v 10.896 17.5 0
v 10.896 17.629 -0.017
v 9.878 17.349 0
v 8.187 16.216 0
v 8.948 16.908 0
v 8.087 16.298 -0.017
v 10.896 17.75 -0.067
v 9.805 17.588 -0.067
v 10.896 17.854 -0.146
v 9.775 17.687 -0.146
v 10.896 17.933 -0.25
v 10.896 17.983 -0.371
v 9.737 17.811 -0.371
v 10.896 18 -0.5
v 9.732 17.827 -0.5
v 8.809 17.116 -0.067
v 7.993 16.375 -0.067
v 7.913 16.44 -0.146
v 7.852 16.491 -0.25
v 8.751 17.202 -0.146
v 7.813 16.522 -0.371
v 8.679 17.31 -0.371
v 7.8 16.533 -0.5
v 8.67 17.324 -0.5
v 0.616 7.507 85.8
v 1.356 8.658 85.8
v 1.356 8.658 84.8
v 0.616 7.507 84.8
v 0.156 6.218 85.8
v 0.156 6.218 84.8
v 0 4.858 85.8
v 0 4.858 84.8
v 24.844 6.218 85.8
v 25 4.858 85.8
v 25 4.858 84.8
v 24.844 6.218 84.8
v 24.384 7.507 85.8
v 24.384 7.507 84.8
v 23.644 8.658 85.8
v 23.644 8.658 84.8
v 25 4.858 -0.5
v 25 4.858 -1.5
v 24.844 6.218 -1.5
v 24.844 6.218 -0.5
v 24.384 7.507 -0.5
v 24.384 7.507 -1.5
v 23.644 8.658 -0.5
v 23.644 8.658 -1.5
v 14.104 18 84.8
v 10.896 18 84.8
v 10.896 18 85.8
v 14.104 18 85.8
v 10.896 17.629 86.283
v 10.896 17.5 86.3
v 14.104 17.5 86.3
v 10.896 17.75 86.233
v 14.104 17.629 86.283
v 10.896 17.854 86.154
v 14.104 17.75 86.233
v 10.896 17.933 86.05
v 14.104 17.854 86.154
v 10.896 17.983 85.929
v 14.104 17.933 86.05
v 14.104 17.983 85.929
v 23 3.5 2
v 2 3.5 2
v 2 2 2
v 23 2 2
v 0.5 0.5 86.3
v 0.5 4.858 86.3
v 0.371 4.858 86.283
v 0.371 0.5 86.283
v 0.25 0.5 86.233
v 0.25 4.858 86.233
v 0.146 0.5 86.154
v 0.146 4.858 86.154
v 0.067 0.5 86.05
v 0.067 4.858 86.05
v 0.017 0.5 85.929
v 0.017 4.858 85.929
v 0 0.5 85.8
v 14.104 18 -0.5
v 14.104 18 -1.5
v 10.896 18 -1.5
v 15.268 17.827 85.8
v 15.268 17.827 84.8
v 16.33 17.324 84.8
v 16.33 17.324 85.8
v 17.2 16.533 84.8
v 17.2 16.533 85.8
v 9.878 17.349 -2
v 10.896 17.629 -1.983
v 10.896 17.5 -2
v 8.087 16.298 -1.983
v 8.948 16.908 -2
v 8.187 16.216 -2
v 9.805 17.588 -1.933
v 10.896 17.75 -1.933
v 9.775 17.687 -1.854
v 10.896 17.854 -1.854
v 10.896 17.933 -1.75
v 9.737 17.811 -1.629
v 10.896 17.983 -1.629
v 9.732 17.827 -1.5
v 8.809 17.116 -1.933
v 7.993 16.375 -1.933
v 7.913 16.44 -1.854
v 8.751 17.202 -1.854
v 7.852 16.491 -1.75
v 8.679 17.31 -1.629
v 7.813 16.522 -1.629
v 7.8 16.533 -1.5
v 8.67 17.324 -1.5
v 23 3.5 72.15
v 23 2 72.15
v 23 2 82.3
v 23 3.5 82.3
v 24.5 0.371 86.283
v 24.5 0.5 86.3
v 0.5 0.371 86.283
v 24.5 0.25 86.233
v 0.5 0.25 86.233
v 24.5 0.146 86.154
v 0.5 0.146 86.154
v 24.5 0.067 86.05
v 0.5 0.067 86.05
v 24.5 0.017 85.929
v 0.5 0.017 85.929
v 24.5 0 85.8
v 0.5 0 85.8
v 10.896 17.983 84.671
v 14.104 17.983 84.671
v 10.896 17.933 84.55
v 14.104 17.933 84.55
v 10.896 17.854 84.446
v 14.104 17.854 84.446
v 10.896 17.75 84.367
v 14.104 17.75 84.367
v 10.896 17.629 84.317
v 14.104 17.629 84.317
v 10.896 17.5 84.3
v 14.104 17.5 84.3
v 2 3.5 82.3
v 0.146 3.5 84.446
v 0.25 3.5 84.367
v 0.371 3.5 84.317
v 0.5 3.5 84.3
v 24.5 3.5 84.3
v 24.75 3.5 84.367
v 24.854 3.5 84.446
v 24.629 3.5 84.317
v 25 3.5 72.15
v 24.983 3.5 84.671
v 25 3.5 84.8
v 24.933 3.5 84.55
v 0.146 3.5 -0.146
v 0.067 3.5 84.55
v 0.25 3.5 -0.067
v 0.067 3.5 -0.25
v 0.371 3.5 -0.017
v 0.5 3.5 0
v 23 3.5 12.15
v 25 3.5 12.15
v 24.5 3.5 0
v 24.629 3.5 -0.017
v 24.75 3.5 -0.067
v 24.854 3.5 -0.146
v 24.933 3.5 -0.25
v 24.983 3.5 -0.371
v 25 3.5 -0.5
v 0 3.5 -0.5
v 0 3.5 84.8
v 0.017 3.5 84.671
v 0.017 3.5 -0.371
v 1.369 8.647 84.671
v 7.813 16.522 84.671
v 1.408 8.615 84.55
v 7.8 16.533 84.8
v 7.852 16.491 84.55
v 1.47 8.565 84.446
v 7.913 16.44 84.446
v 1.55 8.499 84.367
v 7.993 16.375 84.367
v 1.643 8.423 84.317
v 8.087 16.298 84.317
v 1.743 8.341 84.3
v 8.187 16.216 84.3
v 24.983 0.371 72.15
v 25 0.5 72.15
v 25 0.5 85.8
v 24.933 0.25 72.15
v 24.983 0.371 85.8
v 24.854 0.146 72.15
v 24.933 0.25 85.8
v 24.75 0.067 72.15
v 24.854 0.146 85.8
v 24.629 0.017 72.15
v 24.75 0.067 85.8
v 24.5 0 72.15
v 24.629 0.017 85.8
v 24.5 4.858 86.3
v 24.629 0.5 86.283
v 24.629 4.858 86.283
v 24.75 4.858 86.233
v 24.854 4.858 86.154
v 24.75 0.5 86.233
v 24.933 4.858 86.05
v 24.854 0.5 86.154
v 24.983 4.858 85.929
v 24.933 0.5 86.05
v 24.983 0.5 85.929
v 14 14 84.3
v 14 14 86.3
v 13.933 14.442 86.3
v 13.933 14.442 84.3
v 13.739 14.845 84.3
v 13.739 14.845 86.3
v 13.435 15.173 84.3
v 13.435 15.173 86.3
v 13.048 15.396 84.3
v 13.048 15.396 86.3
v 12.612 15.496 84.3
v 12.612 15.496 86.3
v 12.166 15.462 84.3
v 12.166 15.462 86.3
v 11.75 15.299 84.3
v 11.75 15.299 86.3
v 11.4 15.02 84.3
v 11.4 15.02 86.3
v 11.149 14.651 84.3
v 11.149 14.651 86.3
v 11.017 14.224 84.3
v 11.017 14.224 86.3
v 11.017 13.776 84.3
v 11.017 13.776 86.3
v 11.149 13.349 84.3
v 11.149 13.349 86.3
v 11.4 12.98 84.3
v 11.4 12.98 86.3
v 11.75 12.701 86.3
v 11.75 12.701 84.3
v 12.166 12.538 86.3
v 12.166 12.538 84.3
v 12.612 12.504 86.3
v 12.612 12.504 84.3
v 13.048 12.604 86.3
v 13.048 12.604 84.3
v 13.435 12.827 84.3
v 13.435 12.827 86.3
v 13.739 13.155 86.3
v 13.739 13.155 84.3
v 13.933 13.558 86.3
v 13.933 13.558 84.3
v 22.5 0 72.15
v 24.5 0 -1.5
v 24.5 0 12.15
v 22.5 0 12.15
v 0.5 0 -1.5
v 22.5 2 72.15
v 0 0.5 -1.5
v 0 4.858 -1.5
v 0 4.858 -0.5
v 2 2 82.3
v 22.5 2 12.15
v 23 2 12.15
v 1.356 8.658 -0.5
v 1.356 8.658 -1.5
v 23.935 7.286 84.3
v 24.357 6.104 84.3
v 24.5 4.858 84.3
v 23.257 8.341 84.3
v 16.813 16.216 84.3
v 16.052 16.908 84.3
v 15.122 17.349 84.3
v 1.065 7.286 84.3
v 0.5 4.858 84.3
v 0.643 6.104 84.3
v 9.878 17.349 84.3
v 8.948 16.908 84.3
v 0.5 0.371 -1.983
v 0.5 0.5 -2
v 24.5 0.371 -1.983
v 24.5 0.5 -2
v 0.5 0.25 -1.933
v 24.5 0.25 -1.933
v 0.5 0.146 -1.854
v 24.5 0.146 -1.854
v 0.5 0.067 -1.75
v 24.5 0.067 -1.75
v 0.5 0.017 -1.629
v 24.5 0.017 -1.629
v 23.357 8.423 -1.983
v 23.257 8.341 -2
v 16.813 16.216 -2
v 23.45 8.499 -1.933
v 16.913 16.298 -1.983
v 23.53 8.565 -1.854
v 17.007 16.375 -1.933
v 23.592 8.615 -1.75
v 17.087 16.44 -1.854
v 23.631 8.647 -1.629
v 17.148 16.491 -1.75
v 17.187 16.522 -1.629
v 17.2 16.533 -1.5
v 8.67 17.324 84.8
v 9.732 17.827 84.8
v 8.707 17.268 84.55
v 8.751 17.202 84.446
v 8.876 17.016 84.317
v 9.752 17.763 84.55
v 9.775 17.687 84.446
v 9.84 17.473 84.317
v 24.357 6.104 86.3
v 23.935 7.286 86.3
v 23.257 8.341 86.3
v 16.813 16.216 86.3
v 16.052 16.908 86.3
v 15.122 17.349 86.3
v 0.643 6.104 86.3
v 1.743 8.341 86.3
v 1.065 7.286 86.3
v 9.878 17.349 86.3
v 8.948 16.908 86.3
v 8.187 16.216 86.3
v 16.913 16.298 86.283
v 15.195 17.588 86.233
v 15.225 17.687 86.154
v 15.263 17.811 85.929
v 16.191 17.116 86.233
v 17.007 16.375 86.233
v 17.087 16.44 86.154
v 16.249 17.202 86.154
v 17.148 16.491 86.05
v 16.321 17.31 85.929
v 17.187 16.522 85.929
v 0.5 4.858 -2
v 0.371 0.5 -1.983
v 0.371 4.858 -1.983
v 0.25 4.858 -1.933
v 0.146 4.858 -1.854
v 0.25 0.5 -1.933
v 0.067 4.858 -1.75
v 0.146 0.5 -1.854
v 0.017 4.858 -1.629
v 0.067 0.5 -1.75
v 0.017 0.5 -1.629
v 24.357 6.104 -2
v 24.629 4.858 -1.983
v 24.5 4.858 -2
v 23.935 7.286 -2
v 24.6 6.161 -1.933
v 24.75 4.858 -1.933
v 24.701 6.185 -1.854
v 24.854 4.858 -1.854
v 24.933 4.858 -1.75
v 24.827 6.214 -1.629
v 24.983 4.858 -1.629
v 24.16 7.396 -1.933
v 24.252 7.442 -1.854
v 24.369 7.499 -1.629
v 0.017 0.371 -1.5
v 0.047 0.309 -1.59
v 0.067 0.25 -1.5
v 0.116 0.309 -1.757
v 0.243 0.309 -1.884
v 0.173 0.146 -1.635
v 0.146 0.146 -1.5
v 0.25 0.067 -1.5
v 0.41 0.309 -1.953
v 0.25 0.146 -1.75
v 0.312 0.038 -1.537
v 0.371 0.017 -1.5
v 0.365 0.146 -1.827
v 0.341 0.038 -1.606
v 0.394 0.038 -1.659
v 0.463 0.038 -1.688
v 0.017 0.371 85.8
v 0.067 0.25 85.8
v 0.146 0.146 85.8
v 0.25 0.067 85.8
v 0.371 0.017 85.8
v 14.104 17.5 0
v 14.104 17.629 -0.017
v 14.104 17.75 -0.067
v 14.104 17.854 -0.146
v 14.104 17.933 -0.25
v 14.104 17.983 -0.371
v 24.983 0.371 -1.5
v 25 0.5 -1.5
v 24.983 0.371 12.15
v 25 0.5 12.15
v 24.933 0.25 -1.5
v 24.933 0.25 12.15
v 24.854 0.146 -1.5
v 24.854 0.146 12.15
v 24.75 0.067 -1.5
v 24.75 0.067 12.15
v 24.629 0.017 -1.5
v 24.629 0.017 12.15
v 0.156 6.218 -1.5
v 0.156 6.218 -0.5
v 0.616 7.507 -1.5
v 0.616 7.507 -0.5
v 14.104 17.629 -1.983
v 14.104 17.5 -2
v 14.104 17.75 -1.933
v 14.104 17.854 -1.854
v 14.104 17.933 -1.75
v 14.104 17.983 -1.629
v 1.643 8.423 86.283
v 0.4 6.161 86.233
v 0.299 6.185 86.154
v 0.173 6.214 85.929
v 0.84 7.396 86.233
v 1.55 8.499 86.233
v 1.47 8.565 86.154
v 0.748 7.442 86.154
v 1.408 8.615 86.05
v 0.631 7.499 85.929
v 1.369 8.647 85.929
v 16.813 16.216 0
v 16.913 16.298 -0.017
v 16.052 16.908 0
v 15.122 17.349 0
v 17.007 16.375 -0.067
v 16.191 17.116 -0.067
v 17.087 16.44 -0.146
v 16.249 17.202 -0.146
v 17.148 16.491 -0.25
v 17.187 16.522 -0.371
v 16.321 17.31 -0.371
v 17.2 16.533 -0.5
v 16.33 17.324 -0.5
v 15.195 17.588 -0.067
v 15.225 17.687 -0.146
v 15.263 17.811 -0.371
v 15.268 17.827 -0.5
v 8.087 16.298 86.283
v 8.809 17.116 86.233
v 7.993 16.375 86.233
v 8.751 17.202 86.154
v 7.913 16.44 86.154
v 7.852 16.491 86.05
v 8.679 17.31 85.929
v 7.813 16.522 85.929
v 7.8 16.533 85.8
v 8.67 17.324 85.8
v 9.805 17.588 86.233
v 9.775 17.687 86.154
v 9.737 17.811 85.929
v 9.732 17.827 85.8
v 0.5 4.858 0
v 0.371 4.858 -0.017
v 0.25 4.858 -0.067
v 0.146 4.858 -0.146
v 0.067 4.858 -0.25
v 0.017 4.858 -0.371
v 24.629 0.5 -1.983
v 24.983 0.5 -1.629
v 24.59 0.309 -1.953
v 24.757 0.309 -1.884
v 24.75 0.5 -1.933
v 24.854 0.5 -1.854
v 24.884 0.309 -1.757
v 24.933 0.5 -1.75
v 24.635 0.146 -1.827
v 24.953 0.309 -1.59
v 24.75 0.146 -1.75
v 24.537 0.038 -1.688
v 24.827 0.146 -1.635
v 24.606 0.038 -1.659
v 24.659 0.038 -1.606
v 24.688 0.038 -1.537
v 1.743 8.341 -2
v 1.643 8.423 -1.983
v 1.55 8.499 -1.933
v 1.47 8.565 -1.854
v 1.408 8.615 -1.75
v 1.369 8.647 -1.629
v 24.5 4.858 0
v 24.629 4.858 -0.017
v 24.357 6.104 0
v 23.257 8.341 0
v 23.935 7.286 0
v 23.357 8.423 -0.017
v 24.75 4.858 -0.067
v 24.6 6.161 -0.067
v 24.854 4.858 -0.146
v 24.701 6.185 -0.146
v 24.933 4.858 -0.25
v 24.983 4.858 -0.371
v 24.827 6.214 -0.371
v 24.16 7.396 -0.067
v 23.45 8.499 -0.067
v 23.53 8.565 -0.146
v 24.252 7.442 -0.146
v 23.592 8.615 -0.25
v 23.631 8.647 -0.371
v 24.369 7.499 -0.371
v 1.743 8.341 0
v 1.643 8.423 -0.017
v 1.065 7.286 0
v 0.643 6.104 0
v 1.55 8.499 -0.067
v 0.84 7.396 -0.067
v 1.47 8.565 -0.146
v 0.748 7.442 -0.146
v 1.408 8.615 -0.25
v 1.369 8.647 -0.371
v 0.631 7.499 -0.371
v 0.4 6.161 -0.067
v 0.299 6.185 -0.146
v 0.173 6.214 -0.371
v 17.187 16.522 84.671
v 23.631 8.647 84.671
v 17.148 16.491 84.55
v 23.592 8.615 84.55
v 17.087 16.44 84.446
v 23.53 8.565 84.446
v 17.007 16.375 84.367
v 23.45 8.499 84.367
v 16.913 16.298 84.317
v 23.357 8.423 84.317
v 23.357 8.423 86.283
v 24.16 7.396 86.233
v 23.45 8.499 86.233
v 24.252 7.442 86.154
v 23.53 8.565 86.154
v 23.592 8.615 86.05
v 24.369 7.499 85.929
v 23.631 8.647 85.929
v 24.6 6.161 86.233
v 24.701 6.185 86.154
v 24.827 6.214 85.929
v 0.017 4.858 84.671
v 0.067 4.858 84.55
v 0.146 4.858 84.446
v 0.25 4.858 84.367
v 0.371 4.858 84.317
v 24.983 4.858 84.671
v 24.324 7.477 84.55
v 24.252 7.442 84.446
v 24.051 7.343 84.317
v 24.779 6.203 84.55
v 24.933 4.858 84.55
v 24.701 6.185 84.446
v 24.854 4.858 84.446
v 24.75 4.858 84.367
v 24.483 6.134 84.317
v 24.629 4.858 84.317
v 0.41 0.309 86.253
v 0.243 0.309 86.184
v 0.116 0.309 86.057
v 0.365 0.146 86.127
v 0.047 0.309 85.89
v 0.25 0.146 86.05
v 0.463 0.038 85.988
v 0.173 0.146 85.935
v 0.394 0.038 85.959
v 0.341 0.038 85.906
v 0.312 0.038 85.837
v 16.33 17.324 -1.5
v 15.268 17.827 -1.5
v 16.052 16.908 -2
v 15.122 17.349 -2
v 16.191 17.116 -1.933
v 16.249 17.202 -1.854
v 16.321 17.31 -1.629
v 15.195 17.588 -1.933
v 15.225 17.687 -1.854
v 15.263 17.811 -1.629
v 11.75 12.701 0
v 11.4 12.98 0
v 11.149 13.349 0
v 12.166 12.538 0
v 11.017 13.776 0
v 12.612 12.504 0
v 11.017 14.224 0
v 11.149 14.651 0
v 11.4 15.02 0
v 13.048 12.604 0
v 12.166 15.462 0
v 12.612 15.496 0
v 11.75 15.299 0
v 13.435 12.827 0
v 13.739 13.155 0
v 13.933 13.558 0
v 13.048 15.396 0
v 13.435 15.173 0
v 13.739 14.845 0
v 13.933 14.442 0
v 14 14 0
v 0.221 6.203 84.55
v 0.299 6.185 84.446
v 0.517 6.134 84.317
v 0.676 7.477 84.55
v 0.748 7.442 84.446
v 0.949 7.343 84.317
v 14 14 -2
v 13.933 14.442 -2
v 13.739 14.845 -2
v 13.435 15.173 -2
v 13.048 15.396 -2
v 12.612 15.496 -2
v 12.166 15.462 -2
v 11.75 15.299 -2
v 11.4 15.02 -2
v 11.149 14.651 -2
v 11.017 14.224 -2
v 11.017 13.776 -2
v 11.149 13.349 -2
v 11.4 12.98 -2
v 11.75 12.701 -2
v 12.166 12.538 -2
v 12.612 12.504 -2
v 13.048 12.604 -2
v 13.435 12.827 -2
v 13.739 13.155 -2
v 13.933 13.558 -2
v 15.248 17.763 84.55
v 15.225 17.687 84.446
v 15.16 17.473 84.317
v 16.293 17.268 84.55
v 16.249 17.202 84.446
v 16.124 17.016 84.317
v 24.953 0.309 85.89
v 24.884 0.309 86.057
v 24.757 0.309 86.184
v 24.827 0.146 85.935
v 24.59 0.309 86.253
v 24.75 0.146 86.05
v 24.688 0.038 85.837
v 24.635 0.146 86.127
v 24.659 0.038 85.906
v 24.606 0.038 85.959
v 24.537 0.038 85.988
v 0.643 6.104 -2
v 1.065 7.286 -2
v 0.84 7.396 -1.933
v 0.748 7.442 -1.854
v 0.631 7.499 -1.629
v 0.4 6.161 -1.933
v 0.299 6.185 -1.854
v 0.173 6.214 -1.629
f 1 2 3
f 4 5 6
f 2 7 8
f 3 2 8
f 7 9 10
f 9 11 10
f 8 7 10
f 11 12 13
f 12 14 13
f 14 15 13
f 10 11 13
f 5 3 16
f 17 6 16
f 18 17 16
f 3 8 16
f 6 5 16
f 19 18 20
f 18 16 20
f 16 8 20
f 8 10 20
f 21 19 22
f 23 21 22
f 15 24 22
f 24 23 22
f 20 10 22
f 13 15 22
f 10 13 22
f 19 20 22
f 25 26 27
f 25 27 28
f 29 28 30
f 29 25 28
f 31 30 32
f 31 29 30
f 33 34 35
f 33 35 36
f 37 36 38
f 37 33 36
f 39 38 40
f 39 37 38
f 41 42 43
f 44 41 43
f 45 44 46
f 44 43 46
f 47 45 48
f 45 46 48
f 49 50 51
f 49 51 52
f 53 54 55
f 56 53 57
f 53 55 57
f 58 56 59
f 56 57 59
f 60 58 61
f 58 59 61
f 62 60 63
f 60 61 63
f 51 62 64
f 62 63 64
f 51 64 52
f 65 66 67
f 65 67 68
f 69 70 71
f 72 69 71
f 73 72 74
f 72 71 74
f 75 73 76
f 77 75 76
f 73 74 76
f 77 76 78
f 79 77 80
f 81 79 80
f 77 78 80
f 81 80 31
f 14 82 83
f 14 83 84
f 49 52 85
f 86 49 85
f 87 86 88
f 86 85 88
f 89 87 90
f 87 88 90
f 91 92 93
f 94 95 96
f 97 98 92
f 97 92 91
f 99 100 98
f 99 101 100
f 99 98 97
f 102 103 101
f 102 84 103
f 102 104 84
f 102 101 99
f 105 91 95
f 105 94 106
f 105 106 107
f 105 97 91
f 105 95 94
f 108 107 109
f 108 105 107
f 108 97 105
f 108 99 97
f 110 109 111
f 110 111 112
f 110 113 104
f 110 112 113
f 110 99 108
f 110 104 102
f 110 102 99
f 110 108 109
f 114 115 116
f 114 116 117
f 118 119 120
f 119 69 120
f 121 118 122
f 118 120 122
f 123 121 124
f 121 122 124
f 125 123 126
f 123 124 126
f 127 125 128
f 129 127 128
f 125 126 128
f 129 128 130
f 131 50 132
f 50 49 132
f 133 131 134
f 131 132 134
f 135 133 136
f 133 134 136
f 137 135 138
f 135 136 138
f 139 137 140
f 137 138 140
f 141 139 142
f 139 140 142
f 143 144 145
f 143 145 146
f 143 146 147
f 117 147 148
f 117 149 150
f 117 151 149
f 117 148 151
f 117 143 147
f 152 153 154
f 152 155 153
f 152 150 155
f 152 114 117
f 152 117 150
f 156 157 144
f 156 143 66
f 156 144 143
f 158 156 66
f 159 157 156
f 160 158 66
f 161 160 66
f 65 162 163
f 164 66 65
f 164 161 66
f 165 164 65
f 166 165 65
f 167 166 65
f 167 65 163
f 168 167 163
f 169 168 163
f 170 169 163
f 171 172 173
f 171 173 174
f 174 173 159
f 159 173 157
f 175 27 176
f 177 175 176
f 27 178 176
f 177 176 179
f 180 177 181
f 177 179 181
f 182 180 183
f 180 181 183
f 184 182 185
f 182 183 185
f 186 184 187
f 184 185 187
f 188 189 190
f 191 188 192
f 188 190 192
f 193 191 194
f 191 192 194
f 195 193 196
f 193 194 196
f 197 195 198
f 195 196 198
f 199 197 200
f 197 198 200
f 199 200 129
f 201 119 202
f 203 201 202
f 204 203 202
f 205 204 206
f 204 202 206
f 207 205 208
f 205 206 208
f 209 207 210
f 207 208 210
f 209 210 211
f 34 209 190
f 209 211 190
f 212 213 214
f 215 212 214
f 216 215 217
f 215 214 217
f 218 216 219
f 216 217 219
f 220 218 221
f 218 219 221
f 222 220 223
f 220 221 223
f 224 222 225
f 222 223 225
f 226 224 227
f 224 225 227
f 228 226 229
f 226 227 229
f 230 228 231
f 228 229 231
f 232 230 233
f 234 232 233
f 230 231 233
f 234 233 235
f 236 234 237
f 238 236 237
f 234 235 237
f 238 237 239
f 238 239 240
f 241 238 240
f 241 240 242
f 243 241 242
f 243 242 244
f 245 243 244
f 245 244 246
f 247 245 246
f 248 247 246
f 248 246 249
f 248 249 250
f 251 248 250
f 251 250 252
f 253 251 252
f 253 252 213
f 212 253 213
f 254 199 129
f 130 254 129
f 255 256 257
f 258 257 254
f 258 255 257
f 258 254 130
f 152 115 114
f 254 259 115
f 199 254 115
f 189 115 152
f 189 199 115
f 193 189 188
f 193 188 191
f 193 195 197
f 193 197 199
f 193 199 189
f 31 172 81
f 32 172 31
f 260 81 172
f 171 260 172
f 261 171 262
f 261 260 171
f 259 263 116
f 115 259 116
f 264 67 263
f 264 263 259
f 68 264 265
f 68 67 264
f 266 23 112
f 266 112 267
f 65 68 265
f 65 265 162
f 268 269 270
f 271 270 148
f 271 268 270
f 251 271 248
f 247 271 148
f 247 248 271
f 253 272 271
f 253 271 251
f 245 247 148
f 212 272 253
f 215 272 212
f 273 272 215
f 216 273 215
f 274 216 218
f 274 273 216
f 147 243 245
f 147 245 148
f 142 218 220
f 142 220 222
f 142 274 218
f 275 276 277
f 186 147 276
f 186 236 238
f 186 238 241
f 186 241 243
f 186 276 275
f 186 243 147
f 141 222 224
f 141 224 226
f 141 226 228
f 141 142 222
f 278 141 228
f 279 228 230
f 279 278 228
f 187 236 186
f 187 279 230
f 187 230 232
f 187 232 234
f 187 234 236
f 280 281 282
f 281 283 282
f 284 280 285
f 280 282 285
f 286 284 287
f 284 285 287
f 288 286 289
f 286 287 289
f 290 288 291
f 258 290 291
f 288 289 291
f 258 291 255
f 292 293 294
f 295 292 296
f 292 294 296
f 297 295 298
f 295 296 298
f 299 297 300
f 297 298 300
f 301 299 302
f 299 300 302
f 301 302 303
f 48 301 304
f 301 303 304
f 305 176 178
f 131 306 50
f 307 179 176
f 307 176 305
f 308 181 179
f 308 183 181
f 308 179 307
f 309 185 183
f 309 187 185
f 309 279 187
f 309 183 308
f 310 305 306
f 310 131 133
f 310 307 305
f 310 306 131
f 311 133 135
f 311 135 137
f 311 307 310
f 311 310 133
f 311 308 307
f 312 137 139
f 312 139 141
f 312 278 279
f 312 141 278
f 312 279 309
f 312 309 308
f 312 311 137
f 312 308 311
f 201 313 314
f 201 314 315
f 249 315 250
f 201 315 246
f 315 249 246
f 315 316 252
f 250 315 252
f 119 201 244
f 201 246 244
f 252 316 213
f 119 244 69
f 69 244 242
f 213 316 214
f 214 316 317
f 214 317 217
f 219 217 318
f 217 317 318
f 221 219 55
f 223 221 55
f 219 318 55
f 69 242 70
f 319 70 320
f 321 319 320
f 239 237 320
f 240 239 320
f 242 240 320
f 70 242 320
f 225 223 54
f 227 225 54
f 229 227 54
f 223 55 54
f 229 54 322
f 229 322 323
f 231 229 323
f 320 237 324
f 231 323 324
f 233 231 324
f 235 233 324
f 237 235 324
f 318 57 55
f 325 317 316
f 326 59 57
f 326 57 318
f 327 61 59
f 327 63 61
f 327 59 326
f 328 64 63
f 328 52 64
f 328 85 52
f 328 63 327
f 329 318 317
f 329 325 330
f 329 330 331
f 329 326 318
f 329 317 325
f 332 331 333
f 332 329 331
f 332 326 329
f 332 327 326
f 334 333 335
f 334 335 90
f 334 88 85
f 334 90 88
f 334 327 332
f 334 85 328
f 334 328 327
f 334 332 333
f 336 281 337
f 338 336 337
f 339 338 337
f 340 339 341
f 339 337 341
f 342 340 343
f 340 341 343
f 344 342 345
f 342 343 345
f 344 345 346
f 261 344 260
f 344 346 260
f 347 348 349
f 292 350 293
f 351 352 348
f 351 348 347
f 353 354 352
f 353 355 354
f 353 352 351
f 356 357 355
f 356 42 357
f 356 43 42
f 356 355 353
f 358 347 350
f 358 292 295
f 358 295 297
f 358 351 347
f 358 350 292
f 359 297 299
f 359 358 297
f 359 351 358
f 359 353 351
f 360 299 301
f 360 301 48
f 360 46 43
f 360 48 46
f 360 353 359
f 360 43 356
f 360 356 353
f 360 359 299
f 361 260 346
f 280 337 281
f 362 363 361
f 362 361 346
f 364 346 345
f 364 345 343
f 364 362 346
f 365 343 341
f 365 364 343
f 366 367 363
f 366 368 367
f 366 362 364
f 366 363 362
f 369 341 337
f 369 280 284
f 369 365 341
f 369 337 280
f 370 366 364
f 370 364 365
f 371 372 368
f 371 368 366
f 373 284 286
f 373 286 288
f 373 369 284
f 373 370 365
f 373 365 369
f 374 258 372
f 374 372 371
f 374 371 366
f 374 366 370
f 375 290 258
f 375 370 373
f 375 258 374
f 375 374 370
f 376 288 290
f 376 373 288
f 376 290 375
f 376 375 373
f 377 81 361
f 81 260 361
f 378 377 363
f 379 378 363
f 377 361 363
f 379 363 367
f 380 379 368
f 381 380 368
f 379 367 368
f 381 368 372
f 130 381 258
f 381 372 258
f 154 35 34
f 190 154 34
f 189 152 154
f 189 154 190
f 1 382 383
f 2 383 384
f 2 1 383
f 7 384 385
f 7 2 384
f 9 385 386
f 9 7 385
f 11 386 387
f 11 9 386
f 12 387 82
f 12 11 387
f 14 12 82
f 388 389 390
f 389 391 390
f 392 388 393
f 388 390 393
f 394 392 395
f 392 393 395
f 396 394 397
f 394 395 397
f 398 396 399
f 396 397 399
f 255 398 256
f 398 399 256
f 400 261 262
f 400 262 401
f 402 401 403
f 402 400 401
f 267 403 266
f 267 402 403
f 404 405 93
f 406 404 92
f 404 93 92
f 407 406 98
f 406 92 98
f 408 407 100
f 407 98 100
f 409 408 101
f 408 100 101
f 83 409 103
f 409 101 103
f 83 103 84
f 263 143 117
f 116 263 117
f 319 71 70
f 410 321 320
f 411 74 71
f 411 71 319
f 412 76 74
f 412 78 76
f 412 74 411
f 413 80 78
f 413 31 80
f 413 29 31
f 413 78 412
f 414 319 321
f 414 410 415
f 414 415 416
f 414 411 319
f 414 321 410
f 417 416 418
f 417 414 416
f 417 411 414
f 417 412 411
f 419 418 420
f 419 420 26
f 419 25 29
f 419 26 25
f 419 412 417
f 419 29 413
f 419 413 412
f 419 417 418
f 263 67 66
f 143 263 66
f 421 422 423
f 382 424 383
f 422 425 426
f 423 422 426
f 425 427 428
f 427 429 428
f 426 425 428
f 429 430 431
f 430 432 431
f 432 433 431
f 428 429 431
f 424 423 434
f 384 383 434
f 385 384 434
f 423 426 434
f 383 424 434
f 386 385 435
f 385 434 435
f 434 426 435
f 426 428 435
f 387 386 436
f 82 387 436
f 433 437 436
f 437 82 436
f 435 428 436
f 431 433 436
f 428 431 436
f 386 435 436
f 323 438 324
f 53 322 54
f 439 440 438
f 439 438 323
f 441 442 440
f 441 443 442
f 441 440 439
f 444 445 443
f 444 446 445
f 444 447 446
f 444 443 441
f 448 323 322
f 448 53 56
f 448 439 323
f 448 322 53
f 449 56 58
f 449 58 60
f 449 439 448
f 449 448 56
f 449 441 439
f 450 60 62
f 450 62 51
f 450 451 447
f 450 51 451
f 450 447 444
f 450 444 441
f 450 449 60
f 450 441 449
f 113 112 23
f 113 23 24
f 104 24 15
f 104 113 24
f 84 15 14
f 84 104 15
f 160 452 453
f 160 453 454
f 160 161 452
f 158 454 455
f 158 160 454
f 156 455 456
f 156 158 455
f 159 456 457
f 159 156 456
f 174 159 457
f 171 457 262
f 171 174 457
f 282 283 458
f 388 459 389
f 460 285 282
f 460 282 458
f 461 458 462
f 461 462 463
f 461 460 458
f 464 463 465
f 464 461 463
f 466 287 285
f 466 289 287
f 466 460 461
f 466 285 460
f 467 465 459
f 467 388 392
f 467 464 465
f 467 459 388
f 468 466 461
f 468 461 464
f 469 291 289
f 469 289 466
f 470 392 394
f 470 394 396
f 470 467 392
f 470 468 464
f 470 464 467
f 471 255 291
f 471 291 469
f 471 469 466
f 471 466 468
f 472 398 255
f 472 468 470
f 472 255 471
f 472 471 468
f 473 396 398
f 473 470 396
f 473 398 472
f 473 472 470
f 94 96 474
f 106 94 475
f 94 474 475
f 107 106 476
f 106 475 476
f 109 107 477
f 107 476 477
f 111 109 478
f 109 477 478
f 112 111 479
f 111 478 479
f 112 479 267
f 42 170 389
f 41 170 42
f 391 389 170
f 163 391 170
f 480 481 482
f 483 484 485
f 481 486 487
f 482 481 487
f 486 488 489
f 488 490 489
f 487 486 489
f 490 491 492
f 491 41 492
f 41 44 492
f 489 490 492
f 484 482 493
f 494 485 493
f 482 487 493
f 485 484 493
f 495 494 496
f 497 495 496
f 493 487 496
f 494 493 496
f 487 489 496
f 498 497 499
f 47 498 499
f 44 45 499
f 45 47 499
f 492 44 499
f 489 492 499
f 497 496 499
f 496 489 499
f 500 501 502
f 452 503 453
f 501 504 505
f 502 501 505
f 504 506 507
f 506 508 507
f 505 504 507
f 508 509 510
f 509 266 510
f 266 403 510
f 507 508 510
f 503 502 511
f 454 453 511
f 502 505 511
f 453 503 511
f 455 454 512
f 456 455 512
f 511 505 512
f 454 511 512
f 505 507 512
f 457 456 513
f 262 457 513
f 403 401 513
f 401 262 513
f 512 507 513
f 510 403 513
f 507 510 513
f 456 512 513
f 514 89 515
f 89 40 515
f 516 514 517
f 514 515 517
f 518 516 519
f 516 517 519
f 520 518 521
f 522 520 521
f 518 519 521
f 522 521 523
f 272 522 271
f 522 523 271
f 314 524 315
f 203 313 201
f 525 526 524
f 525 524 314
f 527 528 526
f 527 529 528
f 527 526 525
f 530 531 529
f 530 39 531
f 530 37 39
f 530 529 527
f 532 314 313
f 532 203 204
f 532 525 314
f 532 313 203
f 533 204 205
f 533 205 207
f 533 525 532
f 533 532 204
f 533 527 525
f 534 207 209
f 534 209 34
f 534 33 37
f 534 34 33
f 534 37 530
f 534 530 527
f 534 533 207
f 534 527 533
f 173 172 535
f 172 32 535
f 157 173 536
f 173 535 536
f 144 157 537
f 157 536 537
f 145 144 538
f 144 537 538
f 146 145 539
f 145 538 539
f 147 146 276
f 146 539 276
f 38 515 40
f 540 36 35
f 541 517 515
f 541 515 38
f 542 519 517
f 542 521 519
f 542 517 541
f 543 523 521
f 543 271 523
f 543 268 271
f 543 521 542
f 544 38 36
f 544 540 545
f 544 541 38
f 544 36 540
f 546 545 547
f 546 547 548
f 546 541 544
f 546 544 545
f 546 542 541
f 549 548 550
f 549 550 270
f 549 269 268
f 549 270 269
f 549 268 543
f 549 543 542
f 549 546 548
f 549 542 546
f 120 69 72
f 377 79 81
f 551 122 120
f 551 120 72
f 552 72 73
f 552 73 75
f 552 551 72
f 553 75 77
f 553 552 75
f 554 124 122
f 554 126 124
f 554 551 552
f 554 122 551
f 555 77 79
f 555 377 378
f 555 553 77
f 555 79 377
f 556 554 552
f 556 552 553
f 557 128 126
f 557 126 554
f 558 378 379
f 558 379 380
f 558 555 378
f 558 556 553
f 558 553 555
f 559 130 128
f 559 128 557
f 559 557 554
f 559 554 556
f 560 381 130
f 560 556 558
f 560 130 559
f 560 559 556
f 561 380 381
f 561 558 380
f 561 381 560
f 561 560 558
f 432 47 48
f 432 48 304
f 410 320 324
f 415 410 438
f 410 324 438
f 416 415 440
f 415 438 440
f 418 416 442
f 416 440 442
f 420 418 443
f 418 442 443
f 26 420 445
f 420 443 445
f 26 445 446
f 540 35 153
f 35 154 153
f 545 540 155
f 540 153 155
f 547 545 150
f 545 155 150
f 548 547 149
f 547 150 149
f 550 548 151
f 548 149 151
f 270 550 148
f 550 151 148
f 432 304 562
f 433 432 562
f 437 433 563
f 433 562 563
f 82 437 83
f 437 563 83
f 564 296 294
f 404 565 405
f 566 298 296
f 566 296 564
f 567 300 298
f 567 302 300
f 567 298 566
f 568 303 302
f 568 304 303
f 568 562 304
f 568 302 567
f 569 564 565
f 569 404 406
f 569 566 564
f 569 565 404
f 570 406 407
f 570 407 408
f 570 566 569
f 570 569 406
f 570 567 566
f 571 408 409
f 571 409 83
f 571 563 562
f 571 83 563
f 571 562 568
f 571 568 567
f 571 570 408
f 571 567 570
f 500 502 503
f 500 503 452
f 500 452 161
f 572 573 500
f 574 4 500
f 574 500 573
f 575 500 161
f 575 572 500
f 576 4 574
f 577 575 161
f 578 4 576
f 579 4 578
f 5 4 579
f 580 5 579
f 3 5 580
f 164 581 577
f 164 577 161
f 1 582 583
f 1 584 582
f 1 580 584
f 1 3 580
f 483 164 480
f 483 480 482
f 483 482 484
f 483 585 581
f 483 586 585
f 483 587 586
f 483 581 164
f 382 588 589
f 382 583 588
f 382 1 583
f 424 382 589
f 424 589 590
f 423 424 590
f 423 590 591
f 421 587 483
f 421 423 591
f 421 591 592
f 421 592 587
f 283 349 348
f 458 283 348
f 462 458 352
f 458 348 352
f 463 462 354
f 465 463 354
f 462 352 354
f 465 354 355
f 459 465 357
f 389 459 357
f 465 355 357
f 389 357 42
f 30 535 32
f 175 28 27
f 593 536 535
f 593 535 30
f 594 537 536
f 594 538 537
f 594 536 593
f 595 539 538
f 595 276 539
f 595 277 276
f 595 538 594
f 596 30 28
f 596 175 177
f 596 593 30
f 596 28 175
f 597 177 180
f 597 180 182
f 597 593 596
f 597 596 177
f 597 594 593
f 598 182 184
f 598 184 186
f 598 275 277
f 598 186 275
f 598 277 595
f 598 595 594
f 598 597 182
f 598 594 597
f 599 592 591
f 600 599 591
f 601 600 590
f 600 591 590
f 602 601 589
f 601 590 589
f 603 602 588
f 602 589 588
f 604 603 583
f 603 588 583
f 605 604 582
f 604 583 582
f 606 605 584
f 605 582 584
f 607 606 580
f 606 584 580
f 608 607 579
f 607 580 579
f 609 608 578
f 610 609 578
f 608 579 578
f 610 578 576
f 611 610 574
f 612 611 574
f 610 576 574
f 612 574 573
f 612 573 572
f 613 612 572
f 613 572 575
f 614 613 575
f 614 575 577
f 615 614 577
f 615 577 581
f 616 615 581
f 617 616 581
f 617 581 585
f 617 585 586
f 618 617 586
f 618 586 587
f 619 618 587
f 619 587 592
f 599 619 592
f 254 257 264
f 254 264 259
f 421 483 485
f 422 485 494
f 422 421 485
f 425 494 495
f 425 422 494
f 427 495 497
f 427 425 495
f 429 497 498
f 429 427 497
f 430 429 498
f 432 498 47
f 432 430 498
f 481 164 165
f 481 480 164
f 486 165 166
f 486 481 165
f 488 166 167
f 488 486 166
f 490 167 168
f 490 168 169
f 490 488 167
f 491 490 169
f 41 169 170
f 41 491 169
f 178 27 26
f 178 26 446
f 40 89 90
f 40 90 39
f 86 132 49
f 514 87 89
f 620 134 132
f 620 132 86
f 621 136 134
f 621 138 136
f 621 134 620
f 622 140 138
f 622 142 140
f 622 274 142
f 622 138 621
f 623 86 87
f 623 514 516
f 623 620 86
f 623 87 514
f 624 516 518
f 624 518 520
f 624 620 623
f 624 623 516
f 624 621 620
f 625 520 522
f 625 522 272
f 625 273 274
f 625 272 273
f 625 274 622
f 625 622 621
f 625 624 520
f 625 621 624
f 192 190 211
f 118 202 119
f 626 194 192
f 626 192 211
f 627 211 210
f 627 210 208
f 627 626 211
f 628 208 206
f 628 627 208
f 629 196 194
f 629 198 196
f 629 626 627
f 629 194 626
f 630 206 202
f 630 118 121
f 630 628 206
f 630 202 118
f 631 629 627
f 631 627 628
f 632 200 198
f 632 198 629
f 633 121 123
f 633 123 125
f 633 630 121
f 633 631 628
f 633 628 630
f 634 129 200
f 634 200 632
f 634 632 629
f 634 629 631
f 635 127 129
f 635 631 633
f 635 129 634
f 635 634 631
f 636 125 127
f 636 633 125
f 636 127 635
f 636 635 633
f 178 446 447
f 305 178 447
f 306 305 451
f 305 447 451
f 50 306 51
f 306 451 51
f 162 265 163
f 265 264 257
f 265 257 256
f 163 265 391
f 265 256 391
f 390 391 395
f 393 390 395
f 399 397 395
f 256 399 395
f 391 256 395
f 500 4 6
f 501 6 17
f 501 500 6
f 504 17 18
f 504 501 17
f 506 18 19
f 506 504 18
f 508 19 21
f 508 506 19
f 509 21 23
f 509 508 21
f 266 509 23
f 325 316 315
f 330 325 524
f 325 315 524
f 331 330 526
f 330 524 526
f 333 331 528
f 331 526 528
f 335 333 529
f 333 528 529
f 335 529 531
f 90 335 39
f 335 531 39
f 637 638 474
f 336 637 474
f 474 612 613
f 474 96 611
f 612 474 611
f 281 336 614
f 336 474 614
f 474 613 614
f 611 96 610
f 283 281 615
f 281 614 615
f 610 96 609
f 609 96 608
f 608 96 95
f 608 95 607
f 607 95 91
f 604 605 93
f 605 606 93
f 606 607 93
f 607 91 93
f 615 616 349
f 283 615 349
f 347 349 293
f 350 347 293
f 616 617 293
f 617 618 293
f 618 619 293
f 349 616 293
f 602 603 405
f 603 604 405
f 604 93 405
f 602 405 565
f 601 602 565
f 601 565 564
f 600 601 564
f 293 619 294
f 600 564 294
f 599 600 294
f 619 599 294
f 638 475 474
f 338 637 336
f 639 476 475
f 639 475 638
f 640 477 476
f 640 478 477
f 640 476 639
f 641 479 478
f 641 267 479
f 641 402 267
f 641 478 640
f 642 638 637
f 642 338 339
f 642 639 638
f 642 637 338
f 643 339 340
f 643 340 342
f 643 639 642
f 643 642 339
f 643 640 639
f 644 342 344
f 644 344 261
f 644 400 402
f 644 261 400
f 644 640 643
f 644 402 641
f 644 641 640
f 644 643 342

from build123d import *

# Parameters (mm, degrees)
SKETCH_1_W          = 25
SKETCH_1_H          = 3.5
EXTRUDE_1_DEPTH     = 84.3
SHELL_1_T           = -2
SKETCH_2_W          = 2.5
SKETCH_2_H          = 60
CUT_EXTRUDE_1_DEPTH = 88.998522715
EXTRUDE_2_DEPTH     = 2
EXTRUDE_3_DEPTH     = 2
SKETCH_5_R          = 1.5
CUT_EXTRUDE_2_DEPTH = 94.519463215
FILLET_1_R          = 4
FILLET_2_R          = 6
FILLET_3_R          = 0.5
FILLET_4_R          = 0.5


with BuildPart() as part:
    # 草图1 → 凸台-拉伸1 (new body)
    with BuildSketch(Plane.XY):
        with Locations((12.5, 1.75)):
            Rectangle(SKETCH_1_W, SKETCH_1_H)
    extrude(amount=EXTRUDE_1_DEPTH)

    # 抽壳1
    shell_1_openings = [part.faces().sort_by_distance(p)[0] for p in [
        (12.5, 3.5, 42.15),
    ]]
    offset(amount=SHELL_1_T, openings=shell_1_openings, kind=Kind.INTERSECTION)

    # 草图2 → 切除-拉伸1 (cut, through all)
    with BuildSketch(Plane.XZ):
        with Locations((23.75, 42.15)):
            Rectangle(SKETCH_2_W, SKETCH_2_H)
    extrude(amount=-CUT_EXTRUDE_1_DEPTH, mode=Mode.SUBTRACT)

    # 草图3 → 凸台-拉伸2 (add)
    with BuildSketch(Plane(origin=(0, 0, 0), x_dir=(-1, 0, 0), z_dir=(0, 0, -1))):
        Polygon((-25, 7), (-16, 18), (-9, 18), (0, 7), (0, 0), (-25, 0), align=None)
    extrude(amount=EXTRUDE_2_DEPTH)

    # 草图4 → 凸台-拉伸3 (add)
    with BuildSketch(Plane.XY.offset(84.3)):
        Polygon((0, 0), (0, 7), (9, 18), (16, 18), (25, 7), (25, 0), align=None)
    extrude(amount=EXTRUDE_3_DEPTH)

    # 草图5 → 切除-拉伸2 (cut, through all)
    with BuildSketch(Plane.XY.offset(86.3)):
        with Locations((12.5, 14)):
            Circle(SKETCH_5_R)
    extrude(amount=-CUT_EXTRUDE_2_DEPTH, mode=Mode.SUBTRACT)

    # 圆角1
    fillet_1_edges = [part.edges().sort_by_distance(p)[0] for p in [
        (9, 18, -1),
        (16, 18, -1),
        (16, 18, 85.3),
        (9, 18, 85.3),
    ]]
    fillet(fillet_1_edges, radius=FILLET_1_R)

    # 圆角2
    fillet_2_edges = [part.edges().sort_by_distance(p)[0] for p in [
        (25, 7, -1),
        (0, 7, -1),
        (25, 7, 85.3),
        (0, 7, 85.3),
    ]]
    fillet(fillet_2_edges, radius=FILLET_2_R)

    # 圆角3
    fillet_3_edges = [part.edges().sort_by_distance(p)[0] for p in [
        (4.577971759, 12.595298817, 86.3),
        (9.182595707, 17.61467873, 86.3),
        (15.817404293, 17.61467873, 86.3),
        (0, 2.429109865, 86.3),
        (0, 4.179109865, 84.3),
        (20.422028241, 12.595298817, 84.3),
        (24.650772636, 6.87533862, 84.3),
        (0.349227364, 6.87533862, 84.3),
        (20.422028241, 12.595298817, 86.3),
        (24.650772636, 6.87533862, 86.3),
        (0.349227364, 6.87533862, 86.3),
        (25, 2.429109865, -2),
        (25, 4.179109865, 0),
        (4.577971759, 12.595298817, 0),
        (0.349227364, 6.87533862, 0),
        (24.650772636, 6.87533862, 0),
        (4.577971759, 12.595298817, -2),
        (0.349227364, 6.87533862, -2),
        (24.650772636, 6.87533862, -2),
        (0, 4.179109865, 0),
        (0, 2.429109865, -2),
        (25, 4.179109865, 84.3),
        (25, 2.429109865, 86.3),
        (20.422028241, 12.595298817, 0),
        (20.422028241, 12.595298817, -2),
        (12.5, 18, 0),
        (9.182595707, 17.61467873, 0),
        (15.817404293, 17.61467873, 0),
        (12.5, 18, -2),
        (9.182595707, 17.61467873, -2),
        (15.817404293, 17.61467873, -2),
        (12.5, 18, 84.3),
        (12.5, 18, 86.3),
        (4.577971759, 12.595298817, 84.3),
        (9.182595707, 17.61467873, 84.3),
        (15.817404293, 17.61467873, 84.3),
    ]]
    fillet(fillet_3_edges, radius=FILLET_3_R)

    # 圆角4
    fillet_4_edges = [part.edges().sort_by_distance(p)[0] for p in [
        (25, 0, 78.975),
        (24.853553391, 0, -1.853553391),
        (12.5, 0, -2),
        (0.146446609, 0, -1.853553391),
        (0, 0, 42.15),
        (0.146446609, 0, 86.153553391),
        (24.853553391, 0, 86.153553391),
        (12.5, 0, 86.3),
    ]]
    fillet(fillet_4_edges, radius=FILLET_4_R)


solid = part.part
